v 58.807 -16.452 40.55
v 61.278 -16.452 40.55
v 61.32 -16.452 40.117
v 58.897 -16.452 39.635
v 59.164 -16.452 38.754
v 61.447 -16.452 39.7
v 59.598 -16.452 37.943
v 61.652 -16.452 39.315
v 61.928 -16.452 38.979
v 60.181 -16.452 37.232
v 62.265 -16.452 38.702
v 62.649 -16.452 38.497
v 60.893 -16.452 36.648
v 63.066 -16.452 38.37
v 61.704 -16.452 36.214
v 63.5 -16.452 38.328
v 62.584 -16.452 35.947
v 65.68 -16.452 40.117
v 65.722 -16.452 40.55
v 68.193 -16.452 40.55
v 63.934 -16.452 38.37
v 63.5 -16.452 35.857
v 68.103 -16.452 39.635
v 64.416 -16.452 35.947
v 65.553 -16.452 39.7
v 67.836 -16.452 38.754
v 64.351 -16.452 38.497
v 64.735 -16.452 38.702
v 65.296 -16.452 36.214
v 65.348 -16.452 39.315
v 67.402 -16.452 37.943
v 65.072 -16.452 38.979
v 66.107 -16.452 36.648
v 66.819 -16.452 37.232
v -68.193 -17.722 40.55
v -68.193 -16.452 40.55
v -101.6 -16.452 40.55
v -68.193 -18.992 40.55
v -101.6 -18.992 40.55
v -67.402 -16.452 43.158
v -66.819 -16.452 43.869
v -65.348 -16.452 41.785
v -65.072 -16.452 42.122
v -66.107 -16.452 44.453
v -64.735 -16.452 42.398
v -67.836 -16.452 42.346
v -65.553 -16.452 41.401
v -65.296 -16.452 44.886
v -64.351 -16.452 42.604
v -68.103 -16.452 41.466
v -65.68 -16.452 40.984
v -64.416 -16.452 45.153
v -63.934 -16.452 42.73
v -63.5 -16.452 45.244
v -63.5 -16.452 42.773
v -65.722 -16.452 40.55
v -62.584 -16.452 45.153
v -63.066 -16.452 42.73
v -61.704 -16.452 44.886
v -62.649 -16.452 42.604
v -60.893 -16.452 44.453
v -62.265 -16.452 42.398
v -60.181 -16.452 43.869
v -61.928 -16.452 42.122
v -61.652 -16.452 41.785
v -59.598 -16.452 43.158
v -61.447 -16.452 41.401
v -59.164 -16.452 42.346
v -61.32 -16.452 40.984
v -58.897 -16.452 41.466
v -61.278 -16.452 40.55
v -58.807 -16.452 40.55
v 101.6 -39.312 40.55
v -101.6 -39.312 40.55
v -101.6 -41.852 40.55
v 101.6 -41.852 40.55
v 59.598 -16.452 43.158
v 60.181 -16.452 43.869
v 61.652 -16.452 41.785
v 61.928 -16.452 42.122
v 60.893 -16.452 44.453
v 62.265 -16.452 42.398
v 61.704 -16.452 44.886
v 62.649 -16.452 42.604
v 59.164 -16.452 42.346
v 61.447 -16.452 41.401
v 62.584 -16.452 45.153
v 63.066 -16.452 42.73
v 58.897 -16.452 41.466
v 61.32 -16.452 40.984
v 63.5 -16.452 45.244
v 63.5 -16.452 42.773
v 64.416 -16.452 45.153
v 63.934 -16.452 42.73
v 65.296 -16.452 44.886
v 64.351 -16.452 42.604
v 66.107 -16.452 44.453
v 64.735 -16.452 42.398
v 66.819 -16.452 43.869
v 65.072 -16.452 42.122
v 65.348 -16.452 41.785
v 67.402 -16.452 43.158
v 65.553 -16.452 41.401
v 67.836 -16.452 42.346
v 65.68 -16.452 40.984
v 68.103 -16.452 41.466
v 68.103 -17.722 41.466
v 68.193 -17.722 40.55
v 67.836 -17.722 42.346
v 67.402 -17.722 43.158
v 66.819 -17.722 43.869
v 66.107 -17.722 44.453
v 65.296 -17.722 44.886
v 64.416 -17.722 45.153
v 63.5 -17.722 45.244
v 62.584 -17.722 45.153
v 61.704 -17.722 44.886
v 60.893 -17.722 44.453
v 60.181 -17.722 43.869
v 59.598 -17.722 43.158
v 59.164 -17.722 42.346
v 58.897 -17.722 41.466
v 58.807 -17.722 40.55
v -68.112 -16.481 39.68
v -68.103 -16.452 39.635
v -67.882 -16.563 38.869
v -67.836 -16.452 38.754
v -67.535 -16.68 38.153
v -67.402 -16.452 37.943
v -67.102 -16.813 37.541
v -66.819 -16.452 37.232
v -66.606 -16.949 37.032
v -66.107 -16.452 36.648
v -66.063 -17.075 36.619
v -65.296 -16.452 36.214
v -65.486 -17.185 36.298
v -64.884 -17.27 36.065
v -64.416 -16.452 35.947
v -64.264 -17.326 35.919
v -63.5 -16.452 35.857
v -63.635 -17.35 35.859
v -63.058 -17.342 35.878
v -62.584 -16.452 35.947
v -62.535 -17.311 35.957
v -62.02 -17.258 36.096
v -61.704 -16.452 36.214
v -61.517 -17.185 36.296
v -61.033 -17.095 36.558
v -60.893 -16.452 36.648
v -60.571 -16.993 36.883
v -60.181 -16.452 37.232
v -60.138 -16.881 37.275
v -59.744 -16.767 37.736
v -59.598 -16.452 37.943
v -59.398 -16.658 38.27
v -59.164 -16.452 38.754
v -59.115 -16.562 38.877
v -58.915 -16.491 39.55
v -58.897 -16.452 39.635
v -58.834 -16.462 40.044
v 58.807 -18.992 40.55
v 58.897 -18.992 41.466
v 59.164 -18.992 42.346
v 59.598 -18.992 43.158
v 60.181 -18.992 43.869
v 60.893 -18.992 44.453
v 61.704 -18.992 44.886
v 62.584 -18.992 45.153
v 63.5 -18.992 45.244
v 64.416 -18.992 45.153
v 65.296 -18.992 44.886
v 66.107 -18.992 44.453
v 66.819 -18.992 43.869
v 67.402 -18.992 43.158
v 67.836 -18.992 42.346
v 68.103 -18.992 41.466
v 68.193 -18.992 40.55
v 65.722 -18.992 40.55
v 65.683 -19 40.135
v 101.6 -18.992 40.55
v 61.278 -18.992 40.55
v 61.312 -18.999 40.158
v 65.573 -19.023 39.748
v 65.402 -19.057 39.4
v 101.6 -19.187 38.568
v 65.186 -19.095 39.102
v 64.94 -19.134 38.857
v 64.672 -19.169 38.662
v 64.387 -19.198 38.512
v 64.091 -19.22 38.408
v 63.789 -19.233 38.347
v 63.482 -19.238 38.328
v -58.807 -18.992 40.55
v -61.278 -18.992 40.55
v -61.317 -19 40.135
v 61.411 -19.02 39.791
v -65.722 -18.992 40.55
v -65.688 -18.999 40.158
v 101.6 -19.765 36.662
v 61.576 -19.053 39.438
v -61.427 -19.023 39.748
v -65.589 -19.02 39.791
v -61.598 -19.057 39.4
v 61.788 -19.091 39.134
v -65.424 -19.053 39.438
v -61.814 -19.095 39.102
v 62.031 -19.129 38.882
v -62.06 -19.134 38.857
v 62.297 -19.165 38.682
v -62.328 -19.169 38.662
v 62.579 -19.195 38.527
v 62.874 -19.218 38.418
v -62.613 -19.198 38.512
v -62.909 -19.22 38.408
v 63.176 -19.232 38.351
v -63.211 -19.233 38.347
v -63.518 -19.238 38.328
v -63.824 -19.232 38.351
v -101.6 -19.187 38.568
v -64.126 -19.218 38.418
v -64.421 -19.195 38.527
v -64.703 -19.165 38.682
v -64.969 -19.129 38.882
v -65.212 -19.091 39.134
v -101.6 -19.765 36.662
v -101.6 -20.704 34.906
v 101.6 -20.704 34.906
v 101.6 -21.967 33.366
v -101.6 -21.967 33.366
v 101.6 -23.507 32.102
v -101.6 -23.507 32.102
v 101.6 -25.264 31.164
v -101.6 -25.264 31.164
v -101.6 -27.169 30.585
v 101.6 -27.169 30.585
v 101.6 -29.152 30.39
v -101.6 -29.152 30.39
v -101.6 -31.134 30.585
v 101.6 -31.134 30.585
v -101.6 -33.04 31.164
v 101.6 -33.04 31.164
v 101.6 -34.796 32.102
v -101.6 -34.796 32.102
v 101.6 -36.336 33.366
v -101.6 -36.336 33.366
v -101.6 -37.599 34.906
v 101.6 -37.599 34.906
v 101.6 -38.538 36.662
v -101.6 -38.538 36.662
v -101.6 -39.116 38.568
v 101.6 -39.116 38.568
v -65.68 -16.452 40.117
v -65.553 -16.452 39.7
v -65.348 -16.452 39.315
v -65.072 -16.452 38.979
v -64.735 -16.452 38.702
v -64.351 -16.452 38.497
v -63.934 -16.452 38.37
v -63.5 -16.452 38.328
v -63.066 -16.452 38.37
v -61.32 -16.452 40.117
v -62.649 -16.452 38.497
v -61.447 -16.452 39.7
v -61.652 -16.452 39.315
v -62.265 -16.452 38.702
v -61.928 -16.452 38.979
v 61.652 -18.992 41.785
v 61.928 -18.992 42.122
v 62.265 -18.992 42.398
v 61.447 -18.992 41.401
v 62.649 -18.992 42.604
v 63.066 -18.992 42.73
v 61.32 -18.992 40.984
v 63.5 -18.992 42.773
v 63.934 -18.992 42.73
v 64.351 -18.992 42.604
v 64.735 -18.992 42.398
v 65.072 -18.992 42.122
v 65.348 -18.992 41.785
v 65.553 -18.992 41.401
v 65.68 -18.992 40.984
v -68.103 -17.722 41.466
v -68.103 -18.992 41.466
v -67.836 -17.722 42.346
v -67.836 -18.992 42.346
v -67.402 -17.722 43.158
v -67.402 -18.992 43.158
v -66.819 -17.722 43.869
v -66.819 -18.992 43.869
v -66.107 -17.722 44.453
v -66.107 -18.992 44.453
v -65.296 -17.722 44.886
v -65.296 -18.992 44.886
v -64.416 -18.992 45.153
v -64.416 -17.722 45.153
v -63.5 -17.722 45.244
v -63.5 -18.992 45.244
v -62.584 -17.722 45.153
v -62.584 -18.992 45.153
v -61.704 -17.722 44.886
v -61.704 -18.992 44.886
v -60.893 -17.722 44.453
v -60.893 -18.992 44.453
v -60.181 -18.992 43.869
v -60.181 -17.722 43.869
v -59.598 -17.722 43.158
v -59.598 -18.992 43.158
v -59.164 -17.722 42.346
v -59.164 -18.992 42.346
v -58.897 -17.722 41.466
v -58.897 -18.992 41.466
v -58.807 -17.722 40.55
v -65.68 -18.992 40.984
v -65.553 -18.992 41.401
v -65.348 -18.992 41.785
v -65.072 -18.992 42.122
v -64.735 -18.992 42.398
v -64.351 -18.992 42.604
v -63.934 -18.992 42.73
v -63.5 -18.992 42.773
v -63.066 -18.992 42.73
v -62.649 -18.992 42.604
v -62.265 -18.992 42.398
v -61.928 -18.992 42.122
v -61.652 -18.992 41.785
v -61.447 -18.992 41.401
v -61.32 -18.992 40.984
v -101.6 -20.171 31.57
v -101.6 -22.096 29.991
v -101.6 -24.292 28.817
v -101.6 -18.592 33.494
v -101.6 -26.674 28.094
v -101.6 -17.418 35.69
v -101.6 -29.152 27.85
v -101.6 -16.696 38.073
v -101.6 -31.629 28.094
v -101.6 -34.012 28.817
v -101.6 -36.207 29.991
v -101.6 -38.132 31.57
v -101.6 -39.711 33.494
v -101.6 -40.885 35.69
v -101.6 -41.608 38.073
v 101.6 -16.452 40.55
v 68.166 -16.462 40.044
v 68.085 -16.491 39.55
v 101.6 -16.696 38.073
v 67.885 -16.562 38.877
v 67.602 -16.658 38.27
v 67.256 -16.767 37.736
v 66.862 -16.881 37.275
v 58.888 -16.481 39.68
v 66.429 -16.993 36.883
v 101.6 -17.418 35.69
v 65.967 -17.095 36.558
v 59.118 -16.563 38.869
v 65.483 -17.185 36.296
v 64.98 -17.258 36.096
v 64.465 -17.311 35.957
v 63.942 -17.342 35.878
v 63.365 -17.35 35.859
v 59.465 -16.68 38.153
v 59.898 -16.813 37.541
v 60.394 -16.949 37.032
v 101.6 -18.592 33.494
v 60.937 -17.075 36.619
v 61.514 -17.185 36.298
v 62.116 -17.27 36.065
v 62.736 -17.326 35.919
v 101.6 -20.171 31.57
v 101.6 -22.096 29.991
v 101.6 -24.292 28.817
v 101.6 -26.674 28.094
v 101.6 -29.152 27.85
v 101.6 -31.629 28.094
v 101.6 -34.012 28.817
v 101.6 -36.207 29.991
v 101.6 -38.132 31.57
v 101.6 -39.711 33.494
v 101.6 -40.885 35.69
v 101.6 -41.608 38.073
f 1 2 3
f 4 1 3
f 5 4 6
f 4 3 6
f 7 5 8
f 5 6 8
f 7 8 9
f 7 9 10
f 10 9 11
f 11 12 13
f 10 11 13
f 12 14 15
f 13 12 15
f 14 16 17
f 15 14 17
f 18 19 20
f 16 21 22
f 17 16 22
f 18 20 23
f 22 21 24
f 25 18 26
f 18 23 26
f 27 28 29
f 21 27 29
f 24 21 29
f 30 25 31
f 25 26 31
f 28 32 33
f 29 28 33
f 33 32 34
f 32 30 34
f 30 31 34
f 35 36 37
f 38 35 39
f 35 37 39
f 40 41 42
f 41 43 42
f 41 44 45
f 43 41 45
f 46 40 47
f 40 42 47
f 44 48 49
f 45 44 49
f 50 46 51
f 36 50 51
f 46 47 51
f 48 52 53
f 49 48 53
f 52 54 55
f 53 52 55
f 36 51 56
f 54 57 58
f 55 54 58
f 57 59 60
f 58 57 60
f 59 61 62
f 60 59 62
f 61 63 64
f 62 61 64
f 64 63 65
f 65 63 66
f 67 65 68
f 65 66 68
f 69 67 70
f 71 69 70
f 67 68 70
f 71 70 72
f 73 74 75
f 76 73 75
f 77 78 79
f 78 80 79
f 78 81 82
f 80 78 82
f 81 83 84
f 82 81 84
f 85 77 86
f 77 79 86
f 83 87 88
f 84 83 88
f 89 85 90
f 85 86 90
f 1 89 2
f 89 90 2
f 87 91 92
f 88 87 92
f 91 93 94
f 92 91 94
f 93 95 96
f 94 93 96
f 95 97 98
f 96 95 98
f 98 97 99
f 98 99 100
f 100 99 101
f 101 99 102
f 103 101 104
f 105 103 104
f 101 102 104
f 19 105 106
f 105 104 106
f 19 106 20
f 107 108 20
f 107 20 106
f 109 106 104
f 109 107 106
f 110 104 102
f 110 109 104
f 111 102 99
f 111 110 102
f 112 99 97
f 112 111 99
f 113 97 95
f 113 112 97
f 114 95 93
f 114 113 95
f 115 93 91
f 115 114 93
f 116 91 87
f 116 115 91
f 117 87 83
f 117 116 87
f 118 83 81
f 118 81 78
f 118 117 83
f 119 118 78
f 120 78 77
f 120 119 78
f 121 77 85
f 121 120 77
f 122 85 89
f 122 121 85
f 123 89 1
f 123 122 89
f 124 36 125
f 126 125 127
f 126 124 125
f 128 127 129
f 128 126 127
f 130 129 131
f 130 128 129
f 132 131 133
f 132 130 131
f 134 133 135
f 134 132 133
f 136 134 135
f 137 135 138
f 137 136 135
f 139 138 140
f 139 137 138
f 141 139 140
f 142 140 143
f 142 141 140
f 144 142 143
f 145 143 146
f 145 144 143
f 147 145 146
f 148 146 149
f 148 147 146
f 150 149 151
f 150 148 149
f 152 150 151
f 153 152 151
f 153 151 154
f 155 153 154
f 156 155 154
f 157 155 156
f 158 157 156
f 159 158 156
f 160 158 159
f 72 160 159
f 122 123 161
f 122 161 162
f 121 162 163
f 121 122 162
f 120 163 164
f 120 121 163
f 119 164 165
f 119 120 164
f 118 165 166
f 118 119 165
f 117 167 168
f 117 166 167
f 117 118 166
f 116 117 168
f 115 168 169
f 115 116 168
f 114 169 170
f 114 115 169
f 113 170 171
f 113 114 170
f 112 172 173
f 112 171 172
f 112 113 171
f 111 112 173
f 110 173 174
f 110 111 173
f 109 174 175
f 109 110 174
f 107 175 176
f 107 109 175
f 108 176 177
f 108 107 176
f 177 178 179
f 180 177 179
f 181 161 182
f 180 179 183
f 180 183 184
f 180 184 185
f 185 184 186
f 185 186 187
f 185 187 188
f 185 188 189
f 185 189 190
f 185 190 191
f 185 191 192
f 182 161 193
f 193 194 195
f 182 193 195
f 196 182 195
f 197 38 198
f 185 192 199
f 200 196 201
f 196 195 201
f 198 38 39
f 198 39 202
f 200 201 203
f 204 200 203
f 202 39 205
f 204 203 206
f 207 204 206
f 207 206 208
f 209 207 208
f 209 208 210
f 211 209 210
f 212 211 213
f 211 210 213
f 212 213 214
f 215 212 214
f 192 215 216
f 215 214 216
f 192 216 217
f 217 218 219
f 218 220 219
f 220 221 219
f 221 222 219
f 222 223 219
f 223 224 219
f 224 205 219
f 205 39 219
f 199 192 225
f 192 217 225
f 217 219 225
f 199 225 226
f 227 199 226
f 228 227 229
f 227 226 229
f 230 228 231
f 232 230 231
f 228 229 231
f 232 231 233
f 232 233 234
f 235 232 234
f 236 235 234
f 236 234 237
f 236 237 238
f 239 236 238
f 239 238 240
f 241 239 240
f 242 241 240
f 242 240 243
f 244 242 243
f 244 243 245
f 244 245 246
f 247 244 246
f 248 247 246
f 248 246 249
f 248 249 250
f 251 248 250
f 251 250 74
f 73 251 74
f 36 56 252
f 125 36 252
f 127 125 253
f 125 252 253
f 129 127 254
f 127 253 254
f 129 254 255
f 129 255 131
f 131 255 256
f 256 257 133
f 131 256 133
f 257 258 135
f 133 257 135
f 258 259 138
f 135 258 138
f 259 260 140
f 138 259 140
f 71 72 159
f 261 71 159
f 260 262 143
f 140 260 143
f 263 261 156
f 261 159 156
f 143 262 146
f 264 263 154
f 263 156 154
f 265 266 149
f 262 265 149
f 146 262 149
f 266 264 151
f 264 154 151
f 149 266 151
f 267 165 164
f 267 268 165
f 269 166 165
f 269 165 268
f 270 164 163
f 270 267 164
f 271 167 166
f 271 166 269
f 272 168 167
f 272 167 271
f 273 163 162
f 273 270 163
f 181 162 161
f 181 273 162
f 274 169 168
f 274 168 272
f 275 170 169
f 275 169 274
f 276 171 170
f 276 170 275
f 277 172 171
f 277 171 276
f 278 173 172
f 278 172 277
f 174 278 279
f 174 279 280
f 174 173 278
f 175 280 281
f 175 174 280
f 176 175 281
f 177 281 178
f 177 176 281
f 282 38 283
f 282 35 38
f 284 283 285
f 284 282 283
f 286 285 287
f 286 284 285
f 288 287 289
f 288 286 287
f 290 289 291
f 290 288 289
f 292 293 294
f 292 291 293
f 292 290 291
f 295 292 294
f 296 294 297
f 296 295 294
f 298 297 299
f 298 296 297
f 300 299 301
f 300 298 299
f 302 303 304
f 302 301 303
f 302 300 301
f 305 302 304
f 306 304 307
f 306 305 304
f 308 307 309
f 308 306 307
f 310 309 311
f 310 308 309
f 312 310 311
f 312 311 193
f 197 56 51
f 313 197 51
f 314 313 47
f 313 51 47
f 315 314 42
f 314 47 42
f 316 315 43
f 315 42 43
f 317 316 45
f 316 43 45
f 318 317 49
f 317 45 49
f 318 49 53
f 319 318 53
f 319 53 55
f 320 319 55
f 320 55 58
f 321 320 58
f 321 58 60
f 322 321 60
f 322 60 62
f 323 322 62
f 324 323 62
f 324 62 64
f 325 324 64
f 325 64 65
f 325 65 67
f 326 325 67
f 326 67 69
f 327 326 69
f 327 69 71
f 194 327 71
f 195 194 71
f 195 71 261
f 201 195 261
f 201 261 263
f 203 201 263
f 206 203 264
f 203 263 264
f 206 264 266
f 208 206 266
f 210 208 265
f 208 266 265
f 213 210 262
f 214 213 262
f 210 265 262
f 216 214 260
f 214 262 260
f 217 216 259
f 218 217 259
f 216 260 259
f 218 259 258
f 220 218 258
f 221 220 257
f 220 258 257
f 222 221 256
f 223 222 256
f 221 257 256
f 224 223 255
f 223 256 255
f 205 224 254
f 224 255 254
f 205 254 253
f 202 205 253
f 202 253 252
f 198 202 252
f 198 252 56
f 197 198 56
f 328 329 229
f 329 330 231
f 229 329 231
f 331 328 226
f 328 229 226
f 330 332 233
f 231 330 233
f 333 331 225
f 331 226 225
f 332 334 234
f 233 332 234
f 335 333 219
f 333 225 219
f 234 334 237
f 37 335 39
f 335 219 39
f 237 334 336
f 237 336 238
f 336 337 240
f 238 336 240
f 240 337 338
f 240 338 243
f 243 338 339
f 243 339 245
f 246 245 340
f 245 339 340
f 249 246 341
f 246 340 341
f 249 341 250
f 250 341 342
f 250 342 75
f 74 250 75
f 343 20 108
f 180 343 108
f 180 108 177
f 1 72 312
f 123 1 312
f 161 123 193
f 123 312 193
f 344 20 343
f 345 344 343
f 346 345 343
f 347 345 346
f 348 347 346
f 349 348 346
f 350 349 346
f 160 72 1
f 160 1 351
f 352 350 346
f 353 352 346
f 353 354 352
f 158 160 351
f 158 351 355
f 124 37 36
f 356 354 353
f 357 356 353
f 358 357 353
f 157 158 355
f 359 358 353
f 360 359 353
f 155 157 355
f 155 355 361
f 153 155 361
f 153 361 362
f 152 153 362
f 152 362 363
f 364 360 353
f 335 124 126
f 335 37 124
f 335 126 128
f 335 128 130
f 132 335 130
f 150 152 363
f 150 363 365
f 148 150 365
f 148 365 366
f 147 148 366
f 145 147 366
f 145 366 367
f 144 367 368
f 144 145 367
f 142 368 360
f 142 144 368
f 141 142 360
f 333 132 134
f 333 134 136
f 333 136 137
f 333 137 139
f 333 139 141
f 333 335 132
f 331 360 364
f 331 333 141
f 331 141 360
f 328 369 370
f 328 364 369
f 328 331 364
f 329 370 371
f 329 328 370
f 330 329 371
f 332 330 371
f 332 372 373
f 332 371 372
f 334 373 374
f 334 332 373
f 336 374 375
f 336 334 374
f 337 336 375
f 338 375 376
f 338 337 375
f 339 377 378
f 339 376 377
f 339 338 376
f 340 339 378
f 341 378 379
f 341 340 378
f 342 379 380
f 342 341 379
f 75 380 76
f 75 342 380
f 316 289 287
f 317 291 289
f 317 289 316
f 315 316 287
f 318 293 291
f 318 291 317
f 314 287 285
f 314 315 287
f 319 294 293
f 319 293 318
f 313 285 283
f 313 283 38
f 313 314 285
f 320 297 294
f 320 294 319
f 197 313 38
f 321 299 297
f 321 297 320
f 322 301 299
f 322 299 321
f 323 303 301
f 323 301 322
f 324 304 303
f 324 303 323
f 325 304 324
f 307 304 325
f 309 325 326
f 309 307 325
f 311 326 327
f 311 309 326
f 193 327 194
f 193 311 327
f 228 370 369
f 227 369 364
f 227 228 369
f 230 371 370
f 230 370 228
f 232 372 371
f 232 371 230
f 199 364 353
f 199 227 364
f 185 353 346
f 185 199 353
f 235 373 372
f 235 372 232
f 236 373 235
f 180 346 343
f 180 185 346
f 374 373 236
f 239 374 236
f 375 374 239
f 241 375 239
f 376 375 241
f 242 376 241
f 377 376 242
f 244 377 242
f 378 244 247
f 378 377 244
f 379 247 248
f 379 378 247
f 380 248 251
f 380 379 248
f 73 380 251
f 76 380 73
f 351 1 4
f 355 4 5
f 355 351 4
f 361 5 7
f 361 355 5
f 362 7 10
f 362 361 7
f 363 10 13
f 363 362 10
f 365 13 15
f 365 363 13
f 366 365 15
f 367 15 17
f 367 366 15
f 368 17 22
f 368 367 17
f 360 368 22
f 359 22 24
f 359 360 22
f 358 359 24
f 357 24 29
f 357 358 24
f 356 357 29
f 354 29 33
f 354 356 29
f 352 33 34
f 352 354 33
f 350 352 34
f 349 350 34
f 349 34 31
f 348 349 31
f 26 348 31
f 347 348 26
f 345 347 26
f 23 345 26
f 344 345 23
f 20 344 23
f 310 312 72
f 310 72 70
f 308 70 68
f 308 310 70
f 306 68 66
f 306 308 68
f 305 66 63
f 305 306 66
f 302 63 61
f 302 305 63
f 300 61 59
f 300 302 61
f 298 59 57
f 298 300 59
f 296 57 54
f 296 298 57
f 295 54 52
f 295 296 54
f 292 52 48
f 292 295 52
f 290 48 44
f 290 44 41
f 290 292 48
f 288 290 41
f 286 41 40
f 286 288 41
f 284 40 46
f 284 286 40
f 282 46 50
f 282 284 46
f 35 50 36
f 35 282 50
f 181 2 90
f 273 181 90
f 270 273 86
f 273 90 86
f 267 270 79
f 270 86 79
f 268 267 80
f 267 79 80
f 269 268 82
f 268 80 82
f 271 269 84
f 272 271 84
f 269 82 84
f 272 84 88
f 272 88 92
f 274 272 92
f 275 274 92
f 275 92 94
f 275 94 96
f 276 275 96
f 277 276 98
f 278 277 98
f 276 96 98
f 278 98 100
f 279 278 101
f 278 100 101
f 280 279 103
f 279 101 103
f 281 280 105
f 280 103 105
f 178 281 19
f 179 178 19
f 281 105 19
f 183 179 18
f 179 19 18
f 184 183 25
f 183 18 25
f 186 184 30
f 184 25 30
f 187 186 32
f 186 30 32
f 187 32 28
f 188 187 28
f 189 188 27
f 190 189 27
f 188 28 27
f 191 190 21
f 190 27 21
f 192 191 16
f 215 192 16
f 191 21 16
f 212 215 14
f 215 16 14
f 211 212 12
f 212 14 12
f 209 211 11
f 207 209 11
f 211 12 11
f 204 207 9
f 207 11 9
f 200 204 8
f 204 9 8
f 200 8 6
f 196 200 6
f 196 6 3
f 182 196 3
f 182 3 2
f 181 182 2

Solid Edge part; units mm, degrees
sketch "Sketch1" plane through (0, 0, 0) normal (1, 0, 0) x (0, 1, 0)
  line L0 (-39.3116, 40.5502) -> (-41.8516, 40.5502)
  line L1 (-16.4516, 40.5502) -> (-18.9916, 40.5502)
  arc A0 (-18.9916, 40.5502) -> (-39.3116, 40.5502) centre (-29.1516, 40.5502) cw
  arc A1 (-41.8516, 40.5502) -> (-16.4516, 40.5502) centre (-29.1516, 40.5502) ccw
extrude "Protrusion1" add sketch "Sketch1" along normal mid plane 203.2
sketch "Sketch2" plane through (0, -17.7216, 0) normal (0, -1, 0) x (1, 0, 0)
  circle A0 centre (63.5, 40.5502) radius 4.6933
  circle A1 centre (-63.5, 40.5502) radius 4.6933
  dimension "D1" = 127
  dimension "D2" = 63.5
extrude "Protrusion2" add sketch "Sketch2" along normal mid plane 2.54
sketch "Sketch3" plane through (63.5, -16.4516, 40.5502) normal (0, 1, 0) x (-1, 0, 0)
  circle A0 centre (127, 0) radius 2.2225
  circle A1 centre (0, 0) radius 2.2225
  dimension "D1" = 4.445
  dimension "D2" = 127
extrude "Cutout1" cut sketch "Sketch3" against normal up to vertex (12.7 mm away)
properties material "ALUMINUM"
